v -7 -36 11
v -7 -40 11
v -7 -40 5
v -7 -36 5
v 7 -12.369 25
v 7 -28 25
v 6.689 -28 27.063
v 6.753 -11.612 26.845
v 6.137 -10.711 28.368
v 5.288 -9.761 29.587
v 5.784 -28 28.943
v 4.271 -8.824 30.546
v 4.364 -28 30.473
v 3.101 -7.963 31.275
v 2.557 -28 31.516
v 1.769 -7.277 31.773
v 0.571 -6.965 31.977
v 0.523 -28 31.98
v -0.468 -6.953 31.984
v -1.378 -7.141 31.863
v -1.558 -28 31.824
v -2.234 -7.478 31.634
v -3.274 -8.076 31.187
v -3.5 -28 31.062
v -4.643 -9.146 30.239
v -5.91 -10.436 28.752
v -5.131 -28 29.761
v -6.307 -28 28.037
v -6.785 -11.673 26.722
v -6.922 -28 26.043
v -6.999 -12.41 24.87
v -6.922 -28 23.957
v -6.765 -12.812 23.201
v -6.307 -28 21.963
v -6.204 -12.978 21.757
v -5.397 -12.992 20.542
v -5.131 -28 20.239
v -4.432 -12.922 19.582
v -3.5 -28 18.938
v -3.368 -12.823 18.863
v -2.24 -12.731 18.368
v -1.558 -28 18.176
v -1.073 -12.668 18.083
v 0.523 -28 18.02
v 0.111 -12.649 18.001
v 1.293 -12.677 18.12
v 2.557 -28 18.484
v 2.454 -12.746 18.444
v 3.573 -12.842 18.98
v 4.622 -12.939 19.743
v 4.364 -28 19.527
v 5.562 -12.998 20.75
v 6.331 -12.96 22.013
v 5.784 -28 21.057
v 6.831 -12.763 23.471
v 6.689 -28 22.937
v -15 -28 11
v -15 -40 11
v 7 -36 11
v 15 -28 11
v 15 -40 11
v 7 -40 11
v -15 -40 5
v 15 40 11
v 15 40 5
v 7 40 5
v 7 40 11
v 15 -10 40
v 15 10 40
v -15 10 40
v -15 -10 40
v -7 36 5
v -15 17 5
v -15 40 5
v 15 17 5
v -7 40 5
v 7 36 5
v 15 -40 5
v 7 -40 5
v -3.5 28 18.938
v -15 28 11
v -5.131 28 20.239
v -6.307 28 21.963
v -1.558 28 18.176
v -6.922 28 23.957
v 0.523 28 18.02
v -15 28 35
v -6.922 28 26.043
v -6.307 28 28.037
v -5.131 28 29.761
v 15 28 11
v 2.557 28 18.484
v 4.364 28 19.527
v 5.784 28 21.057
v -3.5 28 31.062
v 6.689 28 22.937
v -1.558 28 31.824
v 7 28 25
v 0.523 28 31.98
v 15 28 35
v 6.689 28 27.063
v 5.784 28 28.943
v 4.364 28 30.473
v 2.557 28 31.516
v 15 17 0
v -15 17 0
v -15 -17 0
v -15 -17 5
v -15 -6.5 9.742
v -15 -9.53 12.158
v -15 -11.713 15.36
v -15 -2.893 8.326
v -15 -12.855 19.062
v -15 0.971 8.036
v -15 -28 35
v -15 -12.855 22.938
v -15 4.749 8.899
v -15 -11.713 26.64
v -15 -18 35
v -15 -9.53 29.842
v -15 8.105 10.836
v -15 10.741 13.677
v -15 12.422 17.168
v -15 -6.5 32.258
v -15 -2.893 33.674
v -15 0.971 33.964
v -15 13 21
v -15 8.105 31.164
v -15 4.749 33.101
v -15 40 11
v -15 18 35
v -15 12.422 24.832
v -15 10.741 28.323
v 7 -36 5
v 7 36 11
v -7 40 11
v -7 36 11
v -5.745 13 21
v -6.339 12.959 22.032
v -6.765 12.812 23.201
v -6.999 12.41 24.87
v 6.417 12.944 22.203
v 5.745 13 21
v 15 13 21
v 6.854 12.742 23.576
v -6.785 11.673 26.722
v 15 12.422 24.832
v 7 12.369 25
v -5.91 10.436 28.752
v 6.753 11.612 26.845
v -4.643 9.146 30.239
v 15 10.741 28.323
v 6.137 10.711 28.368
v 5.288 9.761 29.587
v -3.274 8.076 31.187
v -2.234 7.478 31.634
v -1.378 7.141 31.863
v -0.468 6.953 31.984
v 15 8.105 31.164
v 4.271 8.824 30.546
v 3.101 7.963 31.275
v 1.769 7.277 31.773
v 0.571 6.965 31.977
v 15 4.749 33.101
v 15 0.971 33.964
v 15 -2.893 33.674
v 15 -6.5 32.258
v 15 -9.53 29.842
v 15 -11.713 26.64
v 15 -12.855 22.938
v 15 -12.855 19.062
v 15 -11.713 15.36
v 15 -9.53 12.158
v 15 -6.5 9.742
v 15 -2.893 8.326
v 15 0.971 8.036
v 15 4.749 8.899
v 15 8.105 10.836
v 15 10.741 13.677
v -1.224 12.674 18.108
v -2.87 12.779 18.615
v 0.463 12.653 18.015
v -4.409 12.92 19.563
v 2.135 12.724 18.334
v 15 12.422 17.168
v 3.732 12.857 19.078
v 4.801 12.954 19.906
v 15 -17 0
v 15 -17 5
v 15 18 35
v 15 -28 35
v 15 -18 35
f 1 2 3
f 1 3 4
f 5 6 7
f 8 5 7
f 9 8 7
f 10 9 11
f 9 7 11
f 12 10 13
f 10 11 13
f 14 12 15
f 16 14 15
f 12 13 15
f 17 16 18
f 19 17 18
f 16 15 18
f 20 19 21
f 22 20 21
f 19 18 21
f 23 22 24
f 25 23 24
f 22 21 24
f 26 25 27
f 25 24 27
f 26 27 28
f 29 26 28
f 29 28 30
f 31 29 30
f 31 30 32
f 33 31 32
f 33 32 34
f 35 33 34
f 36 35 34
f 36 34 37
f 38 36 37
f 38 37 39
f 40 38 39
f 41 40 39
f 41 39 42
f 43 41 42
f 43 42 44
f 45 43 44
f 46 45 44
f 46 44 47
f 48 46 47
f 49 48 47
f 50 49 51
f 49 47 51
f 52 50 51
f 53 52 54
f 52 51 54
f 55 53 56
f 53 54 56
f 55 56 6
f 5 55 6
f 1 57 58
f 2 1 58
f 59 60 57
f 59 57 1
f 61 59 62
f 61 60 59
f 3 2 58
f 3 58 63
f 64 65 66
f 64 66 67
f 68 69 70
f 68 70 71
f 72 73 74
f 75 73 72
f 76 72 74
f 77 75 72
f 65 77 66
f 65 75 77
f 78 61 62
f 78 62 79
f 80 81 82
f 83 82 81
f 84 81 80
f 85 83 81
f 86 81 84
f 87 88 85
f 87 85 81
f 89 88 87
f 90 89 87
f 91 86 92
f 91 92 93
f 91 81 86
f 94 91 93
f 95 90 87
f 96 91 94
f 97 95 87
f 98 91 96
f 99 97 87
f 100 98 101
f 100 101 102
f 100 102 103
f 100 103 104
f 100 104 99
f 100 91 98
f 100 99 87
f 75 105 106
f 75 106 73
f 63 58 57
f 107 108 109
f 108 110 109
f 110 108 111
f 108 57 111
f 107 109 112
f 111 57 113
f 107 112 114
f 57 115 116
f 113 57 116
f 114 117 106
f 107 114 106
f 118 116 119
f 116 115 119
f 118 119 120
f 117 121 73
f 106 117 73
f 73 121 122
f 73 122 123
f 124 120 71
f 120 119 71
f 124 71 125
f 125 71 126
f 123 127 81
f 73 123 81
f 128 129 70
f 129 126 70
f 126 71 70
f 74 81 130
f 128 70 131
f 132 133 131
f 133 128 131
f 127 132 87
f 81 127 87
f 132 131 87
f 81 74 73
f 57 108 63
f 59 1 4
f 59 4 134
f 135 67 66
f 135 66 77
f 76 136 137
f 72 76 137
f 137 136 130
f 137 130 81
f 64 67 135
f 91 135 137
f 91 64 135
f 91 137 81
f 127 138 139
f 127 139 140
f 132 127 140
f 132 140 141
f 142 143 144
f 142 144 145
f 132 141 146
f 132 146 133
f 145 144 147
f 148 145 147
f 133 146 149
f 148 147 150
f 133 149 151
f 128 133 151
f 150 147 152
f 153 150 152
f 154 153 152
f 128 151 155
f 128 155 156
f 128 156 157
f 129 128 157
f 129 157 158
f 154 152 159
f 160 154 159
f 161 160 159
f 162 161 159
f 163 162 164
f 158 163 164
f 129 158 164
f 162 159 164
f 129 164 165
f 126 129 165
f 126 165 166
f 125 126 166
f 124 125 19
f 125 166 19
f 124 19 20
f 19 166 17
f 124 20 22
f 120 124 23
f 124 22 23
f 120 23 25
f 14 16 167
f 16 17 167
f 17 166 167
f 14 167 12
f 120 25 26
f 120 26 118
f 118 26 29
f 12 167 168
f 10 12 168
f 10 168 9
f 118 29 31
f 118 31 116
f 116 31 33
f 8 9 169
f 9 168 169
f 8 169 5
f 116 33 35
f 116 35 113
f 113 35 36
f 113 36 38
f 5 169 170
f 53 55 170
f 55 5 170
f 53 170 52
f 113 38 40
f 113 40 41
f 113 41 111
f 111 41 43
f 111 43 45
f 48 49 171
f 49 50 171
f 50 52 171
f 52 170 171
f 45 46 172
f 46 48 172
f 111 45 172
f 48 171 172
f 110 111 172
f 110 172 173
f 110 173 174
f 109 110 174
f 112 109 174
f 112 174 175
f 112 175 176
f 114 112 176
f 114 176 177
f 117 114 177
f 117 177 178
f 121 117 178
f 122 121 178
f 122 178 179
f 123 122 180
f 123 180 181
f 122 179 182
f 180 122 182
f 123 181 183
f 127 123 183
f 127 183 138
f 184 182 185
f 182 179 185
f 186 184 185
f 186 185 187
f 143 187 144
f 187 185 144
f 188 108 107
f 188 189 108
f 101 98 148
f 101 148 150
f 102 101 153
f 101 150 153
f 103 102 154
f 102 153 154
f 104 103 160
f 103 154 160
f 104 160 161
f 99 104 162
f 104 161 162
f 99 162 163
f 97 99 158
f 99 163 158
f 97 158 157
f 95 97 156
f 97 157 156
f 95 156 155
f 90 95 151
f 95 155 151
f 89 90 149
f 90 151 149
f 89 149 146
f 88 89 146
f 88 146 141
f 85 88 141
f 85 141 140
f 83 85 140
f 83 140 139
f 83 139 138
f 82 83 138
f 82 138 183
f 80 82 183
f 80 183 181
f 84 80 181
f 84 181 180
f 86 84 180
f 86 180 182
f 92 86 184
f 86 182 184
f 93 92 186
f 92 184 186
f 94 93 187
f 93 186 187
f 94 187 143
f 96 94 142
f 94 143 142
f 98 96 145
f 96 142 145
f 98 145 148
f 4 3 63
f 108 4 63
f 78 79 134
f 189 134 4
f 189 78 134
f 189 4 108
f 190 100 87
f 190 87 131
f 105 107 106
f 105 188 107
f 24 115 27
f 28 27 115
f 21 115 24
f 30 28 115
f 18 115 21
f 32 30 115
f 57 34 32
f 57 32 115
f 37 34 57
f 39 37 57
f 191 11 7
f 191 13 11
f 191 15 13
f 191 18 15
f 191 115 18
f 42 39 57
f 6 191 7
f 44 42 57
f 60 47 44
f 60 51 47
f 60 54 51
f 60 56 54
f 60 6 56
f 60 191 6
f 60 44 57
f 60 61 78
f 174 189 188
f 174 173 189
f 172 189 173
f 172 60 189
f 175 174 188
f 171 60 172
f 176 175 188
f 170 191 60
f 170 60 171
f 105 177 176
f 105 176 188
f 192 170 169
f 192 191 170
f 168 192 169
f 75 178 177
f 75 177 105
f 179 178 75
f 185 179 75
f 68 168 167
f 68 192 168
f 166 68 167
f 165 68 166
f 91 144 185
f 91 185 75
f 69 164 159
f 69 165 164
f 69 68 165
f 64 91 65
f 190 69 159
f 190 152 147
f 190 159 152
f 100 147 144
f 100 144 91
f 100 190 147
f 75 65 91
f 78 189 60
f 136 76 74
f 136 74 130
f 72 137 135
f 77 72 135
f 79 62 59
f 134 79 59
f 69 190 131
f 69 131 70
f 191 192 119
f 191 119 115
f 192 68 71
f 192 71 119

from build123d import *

# Parameters (mm, degrees)
F1_DEPTH = 15
F2_R     = 13
F3_DEPTH = 30.001
F4_W     = 14
F4_H     = 4
F5_DEPTH = 11.001
F6_R     = 7
F7_DEPTH = 68.001


# Not quite as in the source:
# - a pattern or mirror of a feature is missing from the dataset's text; its kind, count and spacing are read off the source's solid


with BuildPart() as f1:
    # F0 (on Right) → F1 (new body, symmetric)
    with BuildSketch(Plane.YZ):
        Polygon((-17, 0), (0, 0), (17, 0), (17, 5), (40, 5), (40, 11), (28, 11), (28, 35), (18, 35), (10, 40), (0, 40), (-10, 40), (-18, 35), (-28, 35), (-28, 11), (-40, 11), (-40, 5), (-17, 5), align=None)
    extrude(amount=F1_DEPTH, both=True)

    # F2 (on face) → F3 (cut, through all)
    with BuildSketch(Plane.YZ.offset(15)):
        with Locations((0, 21)):
            Circle(F2_R)
    extrude(amount=-F3_DEPTH, mode=Mode.SUBTRACT)

    # F4 (on face) → F5 (cut, through all)
    with BuildSketch(Plane.XY.offset(11)):
        with Locations((0, -38)):
            Rectangle(F4_W, F4_H)
    f5 = extrude(amount=-F5_DEPTH, mode=Mode.SUBTRACT)

    # F5_copies: F5 across plane
    add(f5.mirror(Plane.ZX), mode=Mode.SUBTRACT)

    # F6 (on face) → F7 (cut, through all)
    with BuildSketch(Plane.XZ.offset(28)):
        with Locations((0, 25)):
            Circle(F6_R)
    extrude(amount=-F7_DEPTH, mode=Mode.SUBTRACT)


solid = f1.part
